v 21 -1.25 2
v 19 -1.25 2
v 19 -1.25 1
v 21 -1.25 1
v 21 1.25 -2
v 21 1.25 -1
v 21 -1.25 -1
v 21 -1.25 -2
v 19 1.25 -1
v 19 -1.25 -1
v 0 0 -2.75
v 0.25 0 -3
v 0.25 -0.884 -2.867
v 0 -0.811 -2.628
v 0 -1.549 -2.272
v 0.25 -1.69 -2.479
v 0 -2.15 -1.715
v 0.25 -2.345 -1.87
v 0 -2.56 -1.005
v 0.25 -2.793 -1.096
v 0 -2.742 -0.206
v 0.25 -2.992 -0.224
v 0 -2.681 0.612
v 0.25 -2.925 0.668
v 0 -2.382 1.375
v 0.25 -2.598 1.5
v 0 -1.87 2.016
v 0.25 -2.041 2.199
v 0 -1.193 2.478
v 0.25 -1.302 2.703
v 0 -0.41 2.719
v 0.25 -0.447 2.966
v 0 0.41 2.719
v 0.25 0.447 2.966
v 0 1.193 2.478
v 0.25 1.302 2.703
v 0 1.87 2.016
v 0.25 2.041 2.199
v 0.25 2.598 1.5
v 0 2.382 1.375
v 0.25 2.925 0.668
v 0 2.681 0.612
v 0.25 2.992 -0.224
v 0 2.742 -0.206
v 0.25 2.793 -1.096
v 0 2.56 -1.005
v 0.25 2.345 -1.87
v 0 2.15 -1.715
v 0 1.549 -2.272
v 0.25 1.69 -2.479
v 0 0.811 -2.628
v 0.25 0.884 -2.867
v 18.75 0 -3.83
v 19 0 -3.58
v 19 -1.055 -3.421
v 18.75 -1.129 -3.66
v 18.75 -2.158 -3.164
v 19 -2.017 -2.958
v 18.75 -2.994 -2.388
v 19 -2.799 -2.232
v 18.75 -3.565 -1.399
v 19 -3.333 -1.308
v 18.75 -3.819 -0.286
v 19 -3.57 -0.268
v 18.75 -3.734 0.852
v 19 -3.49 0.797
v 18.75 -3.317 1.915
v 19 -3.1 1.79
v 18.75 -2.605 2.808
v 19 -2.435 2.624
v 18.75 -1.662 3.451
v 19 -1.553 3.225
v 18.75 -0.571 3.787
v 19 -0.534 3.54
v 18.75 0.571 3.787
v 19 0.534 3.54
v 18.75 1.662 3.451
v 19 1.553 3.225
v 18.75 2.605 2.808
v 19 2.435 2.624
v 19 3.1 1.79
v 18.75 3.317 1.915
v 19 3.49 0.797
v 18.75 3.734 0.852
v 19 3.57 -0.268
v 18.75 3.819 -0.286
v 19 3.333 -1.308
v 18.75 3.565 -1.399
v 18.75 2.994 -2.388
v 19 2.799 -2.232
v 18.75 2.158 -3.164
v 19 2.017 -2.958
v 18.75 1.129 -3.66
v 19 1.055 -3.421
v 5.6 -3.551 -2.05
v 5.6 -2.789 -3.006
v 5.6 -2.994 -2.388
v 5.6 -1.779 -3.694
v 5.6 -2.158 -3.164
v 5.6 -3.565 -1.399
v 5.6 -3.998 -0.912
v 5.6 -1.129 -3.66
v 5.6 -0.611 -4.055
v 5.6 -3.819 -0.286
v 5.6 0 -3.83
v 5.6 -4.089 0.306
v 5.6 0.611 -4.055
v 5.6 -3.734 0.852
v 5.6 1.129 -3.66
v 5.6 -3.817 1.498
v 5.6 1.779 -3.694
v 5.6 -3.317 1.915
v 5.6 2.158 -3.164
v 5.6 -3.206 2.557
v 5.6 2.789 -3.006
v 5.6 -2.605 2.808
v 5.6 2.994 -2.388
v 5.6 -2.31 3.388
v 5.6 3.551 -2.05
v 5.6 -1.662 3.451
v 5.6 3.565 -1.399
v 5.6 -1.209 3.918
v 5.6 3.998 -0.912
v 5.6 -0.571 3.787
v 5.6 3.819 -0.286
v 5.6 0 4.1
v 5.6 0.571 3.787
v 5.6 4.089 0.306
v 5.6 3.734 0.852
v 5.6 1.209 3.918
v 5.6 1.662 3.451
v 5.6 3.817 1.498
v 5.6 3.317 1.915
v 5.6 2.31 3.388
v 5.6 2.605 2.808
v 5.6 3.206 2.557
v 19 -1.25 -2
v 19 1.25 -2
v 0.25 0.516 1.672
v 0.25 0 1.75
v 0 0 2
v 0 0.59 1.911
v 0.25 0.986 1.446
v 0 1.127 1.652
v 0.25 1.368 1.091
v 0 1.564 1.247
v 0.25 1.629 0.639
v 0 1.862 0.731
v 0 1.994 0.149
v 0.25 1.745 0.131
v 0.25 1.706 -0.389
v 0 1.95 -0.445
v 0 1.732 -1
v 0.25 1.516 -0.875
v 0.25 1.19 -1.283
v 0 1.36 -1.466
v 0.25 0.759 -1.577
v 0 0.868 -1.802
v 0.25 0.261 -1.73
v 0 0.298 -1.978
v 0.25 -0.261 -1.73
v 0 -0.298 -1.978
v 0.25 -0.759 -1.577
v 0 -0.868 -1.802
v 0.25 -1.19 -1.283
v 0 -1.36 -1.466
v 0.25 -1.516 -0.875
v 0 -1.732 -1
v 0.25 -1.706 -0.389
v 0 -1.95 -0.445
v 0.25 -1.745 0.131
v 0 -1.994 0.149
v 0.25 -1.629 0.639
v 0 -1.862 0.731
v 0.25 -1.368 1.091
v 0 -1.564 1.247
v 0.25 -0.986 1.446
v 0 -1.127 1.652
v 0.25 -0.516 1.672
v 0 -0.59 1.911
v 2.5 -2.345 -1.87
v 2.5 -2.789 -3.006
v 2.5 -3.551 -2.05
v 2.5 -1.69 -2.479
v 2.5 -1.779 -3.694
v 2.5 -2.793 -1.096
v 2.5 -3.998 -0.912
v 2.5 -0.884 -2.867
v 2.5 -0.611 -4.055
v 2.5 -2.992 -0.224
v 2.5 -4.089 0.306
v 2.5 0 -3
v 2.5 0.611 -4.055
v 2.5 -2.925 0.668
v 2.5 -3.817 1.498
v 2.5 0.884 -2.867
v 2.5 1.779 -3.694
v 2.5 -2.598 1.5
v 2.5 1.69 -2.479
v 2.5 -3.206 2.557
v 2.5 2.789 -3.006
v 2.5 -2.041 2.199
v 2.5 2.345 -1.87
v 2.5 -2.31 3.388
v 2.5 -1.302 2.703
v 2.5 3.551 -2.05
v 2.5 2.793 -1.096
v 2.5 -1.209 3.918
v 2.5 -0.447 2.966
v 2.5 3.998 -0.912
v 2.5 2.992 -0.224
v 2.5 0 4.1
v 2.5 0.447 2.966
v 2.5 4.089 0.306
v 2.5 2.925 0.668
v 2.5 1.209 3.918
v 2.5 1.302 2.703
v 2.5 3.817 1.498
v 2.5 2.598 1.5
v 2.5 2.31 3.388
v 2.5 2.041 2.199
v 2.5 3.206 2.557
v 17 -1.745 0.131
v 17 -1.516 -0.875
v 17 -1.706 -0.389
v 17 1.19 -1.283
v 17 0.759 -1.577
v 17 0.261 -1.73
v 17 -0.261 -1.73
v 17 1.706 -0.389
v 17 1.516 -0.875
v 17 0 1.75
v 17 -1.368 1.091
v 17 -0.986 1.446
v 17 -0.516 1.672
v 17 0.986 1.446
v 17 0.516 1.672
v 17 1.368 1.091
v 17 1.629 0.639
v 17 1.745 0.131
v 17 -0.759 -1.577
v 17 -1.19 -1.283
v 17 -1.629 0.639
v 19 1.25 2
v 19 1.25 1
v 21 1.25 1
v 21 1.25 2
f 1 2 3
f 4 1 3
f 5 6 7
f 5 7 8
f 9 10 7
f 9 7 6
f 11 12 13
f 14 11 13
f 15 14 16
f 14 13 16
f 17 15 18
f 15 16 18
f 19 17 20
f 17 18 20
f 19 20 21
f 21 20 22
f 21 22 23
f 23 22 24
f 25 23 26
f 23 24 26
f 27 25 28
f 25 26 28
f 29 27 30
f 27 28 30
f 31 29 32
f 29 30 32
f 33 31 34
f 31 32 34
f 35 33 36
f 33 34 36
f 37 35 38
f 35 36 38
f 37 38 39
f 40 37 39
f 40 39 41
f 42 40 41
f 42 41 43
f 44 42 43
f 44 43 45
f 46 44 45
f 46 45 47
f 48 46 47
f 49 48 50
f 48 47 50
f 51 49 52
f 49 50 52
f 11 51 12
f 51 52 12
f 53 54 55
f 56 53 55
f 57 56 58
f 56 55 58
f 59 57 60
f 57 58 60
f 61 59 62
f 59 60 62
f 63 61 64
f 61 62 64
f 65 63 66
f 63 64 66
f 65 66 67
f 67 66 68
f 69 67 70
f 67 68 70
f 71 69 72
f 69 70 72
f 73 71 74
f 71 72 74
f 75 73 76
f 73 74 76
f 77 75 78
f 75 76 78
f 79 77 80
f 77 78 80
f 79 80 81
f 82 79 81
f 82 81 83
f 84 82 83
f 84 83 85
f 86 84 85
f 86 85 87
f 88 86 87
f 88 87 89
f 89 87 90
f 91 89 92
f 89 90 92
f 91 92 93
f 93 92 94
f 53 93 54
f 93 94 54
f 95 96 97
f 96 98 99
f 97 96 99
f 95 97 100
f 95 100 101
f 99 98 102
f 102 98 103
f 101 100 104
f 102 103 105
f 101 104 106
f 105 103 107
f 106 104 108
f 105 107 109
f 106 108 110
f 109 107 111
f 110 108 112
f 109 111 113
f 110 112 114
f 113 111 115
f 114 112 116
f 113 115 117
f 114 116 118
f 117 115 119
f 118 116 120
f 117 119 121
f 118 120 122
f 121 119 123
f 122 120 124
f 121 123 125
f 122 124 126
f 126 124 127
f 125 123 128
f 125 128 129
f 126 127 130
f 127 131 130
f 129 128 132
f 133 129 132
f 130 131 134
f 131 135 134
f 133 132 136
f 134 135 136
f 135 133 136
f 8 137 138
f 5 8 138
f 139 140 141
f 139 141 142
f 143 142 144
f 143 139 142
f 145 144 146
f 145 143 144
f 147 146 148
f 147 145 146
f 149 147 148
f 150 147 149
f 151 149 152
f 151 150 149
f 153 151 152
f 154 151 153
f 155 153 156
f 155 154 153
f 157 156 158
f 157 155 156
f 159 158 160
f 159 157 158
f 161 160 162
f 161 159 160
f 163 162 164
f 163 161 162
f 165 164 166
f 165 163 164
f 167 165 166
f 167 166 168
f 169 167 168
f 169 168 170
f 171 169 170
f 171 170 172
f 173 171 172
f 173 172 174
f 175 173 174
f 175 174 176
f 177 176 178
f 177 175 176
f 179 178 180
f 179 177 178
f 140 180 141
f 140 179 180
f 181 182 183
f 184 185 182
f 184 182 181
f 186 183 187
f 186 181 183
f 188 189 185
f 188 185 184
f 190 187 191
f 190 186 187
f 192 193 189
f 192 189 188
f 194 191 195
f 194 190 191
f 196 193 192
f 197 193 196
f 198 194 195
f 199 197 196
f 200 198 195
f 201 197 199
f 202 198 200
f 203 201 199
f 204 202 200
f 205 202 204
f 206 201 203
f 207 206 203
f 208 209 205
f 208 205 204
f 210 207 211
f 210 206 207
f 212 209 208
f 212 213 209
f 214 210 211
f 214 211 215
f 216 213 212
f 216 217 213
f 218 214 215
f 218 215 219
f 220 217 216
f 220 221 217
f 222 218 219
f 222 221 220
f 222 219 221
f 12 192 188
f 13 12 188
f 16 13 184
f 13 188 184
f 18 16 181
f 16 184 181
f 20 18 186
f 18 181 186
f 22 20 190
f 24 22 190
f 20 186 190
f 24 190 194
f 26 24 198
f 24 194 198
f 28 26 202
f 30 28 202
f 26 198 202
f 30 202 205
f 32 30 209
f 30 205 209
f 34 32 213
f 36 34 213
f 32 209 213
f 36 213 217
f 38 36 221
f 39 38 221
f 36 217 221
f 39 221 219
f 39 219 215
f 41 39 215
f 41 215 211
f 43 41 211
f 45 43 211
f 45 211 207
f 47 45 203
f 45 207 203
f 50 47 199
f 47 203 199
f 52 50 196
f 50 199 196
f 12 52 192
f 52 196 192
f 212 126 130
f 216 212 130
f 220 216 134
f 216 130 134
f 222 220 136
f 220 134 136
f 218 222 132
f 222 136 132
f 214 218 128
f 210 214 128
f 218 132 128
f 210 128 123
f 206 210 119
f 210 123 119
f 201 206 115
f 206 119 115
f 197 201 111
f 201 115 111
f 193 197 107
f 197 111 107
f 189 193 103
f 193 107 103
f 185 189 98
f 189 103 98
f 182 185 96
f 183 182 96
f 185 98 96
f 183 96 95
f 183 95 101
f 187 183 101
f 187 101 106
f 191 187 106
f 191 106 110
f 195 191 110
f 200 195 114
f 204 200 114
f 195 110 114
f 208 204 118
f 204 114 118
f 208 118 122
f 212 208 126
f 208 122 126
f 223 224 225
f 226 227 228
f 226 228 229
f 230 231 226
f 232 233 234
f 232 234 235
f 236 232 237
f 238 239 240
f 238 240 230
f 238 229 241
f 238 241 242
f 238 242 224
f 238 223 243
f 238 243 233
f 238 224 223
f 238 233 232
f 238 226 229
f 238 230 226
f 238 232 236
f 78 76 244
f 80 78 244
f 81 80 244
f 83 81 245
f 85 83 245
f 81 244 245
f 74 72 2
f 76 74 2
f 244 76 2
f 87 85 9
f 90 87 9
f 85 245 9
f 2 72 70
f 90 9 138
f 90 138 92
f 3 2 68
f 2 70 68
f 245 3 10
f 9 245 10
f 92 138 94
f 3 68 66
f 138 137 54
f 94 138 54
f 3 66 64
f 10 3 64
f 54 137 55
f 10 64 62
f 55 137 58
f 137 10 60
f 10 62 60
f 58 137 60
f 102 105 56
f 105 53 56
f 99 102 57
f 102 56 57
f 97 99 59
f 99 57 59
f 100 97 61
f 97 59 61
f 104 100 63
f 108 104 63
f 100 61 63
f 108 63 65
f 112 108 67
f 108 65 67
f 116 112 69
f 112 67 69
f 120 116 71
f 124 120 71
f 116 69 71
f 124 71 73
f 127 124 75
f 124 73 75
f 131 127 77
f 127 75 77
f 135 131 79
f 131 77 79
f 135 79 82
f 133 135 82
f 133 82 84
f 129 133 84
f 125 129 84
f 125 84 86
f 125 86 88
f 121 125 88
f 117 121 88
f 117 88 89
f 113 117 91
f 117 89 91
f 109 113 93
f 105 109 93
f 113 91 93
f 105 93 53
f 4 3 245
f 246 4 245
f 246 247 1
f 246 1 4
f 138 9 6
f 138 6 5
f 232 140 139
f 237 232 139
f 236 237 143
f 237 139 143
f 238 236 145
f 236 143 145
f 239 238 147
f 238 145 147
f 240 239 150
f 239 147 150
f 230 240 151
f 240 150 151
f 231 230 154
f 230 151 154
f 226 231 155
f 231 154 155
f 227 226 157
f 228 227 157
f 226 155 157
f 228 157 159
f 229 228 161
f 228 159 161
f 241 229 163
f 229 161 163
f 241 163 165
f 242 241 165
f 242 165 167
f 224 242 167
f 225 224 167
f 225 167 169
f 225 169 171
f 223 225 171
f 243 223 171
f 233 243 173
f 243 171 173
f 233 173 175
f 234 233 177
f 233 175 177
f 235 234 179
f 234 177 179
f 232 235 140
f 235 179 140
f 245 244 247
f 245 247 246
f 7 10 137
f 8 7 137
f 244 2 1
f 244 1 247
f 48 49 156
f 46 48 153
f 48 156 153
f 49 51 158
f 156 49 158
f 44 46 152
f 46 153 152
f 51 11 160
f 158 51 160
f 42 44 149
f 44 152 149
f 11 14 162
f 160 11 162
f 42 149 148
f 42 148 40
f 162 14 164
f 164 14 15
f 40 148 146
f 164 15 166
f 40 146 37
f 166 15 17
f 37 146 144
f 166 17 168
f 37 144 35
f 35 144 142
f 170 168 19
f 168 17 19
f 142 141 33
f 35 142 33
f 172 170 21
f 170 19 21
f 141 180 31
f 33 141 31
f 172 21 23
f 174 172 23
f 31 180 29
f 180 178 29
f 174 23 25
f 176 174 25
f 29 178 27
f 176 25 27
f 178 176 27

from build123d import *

# Parameters (mm, degrees)
SKETCH2_R           = 1.75
CUT_EXTRUDE1_DEPTH  = 17
SKETCH3_W           = 1
SKETCH3_H           = 2.5
BOSS_EXTRUDE1_DEPTH = 2
CHAMFER1_SIZE       = 0.25
BOSS_EXTRUDE2_START = -3.1
SKETCH5_R           = 4.10031535
SKETCH5_R_2         = 3.83
BOSS_EXTRUDE2_DEPTH = 3.1


with BuildPart() as part:
    # Sketch1 → Revolve1 (revolve)
    with BuildSketch(Plane(origin=(0, 0, 0), x_dir=(1, 0, 0), z_dir=(0, 1, 0))):
        Polygon((0, 0), (0, 3), (2.5, 3), (2.5, 3.83), (19, 3.83), (19, 0), align=None)
    revolve(axis=Axis((19, 0, 0), (-1, 0, 0)))

    # Sketch2 → Cut-Extrude1 (cut)
    with BuildSketch(Plane.ZY):
        Circle(SKETCH2_R)
    extrude(amount=-CUT_EXTRUDE1_DEPTH, mode=Mode.SUBTRACT)

    # Sketch3 → Boss-Extrude1 (add)
    with BuildSketch(Plane(origin=(19, 0, 0), x_dir=(0, 0, -1), z_dir=(1, 0, 0))):
        with Locations((-1.5, 0)):
            Rectangle(SKETCH3_W, SKETCH3_H)
        with Locations((1.5, 0)):
            Rectangle(SKETCH3_W, SKETCH3_H)
    extrude(amount=BOSS_EXTRUDE1_DEPTH)

    # Chamfer1
    chamfer1_edges = [part.edges().sort_by_distance(p)[0] for p in [
        (19, 0, 3.83),
        (0, 0, 3),
        (0, 0, -1.75),
    ]]
    chamfer(chamfer1_edges, length=CHAMFER1_SIZE)

    # Sketch5 → Boss-Extrude2 (add)
    with BuildSketch(Plane.ZY.offset(-2.5).offset(BOSS_EXTRUDE2_START)):
        Circle(SKETCH5_R)
        Circle(SKETCH5_R_2, mode=Mode.SUBTRACT)
    extrude(amount=BOSS_EXTRUDE2_DEPTH)


solid = part.part
